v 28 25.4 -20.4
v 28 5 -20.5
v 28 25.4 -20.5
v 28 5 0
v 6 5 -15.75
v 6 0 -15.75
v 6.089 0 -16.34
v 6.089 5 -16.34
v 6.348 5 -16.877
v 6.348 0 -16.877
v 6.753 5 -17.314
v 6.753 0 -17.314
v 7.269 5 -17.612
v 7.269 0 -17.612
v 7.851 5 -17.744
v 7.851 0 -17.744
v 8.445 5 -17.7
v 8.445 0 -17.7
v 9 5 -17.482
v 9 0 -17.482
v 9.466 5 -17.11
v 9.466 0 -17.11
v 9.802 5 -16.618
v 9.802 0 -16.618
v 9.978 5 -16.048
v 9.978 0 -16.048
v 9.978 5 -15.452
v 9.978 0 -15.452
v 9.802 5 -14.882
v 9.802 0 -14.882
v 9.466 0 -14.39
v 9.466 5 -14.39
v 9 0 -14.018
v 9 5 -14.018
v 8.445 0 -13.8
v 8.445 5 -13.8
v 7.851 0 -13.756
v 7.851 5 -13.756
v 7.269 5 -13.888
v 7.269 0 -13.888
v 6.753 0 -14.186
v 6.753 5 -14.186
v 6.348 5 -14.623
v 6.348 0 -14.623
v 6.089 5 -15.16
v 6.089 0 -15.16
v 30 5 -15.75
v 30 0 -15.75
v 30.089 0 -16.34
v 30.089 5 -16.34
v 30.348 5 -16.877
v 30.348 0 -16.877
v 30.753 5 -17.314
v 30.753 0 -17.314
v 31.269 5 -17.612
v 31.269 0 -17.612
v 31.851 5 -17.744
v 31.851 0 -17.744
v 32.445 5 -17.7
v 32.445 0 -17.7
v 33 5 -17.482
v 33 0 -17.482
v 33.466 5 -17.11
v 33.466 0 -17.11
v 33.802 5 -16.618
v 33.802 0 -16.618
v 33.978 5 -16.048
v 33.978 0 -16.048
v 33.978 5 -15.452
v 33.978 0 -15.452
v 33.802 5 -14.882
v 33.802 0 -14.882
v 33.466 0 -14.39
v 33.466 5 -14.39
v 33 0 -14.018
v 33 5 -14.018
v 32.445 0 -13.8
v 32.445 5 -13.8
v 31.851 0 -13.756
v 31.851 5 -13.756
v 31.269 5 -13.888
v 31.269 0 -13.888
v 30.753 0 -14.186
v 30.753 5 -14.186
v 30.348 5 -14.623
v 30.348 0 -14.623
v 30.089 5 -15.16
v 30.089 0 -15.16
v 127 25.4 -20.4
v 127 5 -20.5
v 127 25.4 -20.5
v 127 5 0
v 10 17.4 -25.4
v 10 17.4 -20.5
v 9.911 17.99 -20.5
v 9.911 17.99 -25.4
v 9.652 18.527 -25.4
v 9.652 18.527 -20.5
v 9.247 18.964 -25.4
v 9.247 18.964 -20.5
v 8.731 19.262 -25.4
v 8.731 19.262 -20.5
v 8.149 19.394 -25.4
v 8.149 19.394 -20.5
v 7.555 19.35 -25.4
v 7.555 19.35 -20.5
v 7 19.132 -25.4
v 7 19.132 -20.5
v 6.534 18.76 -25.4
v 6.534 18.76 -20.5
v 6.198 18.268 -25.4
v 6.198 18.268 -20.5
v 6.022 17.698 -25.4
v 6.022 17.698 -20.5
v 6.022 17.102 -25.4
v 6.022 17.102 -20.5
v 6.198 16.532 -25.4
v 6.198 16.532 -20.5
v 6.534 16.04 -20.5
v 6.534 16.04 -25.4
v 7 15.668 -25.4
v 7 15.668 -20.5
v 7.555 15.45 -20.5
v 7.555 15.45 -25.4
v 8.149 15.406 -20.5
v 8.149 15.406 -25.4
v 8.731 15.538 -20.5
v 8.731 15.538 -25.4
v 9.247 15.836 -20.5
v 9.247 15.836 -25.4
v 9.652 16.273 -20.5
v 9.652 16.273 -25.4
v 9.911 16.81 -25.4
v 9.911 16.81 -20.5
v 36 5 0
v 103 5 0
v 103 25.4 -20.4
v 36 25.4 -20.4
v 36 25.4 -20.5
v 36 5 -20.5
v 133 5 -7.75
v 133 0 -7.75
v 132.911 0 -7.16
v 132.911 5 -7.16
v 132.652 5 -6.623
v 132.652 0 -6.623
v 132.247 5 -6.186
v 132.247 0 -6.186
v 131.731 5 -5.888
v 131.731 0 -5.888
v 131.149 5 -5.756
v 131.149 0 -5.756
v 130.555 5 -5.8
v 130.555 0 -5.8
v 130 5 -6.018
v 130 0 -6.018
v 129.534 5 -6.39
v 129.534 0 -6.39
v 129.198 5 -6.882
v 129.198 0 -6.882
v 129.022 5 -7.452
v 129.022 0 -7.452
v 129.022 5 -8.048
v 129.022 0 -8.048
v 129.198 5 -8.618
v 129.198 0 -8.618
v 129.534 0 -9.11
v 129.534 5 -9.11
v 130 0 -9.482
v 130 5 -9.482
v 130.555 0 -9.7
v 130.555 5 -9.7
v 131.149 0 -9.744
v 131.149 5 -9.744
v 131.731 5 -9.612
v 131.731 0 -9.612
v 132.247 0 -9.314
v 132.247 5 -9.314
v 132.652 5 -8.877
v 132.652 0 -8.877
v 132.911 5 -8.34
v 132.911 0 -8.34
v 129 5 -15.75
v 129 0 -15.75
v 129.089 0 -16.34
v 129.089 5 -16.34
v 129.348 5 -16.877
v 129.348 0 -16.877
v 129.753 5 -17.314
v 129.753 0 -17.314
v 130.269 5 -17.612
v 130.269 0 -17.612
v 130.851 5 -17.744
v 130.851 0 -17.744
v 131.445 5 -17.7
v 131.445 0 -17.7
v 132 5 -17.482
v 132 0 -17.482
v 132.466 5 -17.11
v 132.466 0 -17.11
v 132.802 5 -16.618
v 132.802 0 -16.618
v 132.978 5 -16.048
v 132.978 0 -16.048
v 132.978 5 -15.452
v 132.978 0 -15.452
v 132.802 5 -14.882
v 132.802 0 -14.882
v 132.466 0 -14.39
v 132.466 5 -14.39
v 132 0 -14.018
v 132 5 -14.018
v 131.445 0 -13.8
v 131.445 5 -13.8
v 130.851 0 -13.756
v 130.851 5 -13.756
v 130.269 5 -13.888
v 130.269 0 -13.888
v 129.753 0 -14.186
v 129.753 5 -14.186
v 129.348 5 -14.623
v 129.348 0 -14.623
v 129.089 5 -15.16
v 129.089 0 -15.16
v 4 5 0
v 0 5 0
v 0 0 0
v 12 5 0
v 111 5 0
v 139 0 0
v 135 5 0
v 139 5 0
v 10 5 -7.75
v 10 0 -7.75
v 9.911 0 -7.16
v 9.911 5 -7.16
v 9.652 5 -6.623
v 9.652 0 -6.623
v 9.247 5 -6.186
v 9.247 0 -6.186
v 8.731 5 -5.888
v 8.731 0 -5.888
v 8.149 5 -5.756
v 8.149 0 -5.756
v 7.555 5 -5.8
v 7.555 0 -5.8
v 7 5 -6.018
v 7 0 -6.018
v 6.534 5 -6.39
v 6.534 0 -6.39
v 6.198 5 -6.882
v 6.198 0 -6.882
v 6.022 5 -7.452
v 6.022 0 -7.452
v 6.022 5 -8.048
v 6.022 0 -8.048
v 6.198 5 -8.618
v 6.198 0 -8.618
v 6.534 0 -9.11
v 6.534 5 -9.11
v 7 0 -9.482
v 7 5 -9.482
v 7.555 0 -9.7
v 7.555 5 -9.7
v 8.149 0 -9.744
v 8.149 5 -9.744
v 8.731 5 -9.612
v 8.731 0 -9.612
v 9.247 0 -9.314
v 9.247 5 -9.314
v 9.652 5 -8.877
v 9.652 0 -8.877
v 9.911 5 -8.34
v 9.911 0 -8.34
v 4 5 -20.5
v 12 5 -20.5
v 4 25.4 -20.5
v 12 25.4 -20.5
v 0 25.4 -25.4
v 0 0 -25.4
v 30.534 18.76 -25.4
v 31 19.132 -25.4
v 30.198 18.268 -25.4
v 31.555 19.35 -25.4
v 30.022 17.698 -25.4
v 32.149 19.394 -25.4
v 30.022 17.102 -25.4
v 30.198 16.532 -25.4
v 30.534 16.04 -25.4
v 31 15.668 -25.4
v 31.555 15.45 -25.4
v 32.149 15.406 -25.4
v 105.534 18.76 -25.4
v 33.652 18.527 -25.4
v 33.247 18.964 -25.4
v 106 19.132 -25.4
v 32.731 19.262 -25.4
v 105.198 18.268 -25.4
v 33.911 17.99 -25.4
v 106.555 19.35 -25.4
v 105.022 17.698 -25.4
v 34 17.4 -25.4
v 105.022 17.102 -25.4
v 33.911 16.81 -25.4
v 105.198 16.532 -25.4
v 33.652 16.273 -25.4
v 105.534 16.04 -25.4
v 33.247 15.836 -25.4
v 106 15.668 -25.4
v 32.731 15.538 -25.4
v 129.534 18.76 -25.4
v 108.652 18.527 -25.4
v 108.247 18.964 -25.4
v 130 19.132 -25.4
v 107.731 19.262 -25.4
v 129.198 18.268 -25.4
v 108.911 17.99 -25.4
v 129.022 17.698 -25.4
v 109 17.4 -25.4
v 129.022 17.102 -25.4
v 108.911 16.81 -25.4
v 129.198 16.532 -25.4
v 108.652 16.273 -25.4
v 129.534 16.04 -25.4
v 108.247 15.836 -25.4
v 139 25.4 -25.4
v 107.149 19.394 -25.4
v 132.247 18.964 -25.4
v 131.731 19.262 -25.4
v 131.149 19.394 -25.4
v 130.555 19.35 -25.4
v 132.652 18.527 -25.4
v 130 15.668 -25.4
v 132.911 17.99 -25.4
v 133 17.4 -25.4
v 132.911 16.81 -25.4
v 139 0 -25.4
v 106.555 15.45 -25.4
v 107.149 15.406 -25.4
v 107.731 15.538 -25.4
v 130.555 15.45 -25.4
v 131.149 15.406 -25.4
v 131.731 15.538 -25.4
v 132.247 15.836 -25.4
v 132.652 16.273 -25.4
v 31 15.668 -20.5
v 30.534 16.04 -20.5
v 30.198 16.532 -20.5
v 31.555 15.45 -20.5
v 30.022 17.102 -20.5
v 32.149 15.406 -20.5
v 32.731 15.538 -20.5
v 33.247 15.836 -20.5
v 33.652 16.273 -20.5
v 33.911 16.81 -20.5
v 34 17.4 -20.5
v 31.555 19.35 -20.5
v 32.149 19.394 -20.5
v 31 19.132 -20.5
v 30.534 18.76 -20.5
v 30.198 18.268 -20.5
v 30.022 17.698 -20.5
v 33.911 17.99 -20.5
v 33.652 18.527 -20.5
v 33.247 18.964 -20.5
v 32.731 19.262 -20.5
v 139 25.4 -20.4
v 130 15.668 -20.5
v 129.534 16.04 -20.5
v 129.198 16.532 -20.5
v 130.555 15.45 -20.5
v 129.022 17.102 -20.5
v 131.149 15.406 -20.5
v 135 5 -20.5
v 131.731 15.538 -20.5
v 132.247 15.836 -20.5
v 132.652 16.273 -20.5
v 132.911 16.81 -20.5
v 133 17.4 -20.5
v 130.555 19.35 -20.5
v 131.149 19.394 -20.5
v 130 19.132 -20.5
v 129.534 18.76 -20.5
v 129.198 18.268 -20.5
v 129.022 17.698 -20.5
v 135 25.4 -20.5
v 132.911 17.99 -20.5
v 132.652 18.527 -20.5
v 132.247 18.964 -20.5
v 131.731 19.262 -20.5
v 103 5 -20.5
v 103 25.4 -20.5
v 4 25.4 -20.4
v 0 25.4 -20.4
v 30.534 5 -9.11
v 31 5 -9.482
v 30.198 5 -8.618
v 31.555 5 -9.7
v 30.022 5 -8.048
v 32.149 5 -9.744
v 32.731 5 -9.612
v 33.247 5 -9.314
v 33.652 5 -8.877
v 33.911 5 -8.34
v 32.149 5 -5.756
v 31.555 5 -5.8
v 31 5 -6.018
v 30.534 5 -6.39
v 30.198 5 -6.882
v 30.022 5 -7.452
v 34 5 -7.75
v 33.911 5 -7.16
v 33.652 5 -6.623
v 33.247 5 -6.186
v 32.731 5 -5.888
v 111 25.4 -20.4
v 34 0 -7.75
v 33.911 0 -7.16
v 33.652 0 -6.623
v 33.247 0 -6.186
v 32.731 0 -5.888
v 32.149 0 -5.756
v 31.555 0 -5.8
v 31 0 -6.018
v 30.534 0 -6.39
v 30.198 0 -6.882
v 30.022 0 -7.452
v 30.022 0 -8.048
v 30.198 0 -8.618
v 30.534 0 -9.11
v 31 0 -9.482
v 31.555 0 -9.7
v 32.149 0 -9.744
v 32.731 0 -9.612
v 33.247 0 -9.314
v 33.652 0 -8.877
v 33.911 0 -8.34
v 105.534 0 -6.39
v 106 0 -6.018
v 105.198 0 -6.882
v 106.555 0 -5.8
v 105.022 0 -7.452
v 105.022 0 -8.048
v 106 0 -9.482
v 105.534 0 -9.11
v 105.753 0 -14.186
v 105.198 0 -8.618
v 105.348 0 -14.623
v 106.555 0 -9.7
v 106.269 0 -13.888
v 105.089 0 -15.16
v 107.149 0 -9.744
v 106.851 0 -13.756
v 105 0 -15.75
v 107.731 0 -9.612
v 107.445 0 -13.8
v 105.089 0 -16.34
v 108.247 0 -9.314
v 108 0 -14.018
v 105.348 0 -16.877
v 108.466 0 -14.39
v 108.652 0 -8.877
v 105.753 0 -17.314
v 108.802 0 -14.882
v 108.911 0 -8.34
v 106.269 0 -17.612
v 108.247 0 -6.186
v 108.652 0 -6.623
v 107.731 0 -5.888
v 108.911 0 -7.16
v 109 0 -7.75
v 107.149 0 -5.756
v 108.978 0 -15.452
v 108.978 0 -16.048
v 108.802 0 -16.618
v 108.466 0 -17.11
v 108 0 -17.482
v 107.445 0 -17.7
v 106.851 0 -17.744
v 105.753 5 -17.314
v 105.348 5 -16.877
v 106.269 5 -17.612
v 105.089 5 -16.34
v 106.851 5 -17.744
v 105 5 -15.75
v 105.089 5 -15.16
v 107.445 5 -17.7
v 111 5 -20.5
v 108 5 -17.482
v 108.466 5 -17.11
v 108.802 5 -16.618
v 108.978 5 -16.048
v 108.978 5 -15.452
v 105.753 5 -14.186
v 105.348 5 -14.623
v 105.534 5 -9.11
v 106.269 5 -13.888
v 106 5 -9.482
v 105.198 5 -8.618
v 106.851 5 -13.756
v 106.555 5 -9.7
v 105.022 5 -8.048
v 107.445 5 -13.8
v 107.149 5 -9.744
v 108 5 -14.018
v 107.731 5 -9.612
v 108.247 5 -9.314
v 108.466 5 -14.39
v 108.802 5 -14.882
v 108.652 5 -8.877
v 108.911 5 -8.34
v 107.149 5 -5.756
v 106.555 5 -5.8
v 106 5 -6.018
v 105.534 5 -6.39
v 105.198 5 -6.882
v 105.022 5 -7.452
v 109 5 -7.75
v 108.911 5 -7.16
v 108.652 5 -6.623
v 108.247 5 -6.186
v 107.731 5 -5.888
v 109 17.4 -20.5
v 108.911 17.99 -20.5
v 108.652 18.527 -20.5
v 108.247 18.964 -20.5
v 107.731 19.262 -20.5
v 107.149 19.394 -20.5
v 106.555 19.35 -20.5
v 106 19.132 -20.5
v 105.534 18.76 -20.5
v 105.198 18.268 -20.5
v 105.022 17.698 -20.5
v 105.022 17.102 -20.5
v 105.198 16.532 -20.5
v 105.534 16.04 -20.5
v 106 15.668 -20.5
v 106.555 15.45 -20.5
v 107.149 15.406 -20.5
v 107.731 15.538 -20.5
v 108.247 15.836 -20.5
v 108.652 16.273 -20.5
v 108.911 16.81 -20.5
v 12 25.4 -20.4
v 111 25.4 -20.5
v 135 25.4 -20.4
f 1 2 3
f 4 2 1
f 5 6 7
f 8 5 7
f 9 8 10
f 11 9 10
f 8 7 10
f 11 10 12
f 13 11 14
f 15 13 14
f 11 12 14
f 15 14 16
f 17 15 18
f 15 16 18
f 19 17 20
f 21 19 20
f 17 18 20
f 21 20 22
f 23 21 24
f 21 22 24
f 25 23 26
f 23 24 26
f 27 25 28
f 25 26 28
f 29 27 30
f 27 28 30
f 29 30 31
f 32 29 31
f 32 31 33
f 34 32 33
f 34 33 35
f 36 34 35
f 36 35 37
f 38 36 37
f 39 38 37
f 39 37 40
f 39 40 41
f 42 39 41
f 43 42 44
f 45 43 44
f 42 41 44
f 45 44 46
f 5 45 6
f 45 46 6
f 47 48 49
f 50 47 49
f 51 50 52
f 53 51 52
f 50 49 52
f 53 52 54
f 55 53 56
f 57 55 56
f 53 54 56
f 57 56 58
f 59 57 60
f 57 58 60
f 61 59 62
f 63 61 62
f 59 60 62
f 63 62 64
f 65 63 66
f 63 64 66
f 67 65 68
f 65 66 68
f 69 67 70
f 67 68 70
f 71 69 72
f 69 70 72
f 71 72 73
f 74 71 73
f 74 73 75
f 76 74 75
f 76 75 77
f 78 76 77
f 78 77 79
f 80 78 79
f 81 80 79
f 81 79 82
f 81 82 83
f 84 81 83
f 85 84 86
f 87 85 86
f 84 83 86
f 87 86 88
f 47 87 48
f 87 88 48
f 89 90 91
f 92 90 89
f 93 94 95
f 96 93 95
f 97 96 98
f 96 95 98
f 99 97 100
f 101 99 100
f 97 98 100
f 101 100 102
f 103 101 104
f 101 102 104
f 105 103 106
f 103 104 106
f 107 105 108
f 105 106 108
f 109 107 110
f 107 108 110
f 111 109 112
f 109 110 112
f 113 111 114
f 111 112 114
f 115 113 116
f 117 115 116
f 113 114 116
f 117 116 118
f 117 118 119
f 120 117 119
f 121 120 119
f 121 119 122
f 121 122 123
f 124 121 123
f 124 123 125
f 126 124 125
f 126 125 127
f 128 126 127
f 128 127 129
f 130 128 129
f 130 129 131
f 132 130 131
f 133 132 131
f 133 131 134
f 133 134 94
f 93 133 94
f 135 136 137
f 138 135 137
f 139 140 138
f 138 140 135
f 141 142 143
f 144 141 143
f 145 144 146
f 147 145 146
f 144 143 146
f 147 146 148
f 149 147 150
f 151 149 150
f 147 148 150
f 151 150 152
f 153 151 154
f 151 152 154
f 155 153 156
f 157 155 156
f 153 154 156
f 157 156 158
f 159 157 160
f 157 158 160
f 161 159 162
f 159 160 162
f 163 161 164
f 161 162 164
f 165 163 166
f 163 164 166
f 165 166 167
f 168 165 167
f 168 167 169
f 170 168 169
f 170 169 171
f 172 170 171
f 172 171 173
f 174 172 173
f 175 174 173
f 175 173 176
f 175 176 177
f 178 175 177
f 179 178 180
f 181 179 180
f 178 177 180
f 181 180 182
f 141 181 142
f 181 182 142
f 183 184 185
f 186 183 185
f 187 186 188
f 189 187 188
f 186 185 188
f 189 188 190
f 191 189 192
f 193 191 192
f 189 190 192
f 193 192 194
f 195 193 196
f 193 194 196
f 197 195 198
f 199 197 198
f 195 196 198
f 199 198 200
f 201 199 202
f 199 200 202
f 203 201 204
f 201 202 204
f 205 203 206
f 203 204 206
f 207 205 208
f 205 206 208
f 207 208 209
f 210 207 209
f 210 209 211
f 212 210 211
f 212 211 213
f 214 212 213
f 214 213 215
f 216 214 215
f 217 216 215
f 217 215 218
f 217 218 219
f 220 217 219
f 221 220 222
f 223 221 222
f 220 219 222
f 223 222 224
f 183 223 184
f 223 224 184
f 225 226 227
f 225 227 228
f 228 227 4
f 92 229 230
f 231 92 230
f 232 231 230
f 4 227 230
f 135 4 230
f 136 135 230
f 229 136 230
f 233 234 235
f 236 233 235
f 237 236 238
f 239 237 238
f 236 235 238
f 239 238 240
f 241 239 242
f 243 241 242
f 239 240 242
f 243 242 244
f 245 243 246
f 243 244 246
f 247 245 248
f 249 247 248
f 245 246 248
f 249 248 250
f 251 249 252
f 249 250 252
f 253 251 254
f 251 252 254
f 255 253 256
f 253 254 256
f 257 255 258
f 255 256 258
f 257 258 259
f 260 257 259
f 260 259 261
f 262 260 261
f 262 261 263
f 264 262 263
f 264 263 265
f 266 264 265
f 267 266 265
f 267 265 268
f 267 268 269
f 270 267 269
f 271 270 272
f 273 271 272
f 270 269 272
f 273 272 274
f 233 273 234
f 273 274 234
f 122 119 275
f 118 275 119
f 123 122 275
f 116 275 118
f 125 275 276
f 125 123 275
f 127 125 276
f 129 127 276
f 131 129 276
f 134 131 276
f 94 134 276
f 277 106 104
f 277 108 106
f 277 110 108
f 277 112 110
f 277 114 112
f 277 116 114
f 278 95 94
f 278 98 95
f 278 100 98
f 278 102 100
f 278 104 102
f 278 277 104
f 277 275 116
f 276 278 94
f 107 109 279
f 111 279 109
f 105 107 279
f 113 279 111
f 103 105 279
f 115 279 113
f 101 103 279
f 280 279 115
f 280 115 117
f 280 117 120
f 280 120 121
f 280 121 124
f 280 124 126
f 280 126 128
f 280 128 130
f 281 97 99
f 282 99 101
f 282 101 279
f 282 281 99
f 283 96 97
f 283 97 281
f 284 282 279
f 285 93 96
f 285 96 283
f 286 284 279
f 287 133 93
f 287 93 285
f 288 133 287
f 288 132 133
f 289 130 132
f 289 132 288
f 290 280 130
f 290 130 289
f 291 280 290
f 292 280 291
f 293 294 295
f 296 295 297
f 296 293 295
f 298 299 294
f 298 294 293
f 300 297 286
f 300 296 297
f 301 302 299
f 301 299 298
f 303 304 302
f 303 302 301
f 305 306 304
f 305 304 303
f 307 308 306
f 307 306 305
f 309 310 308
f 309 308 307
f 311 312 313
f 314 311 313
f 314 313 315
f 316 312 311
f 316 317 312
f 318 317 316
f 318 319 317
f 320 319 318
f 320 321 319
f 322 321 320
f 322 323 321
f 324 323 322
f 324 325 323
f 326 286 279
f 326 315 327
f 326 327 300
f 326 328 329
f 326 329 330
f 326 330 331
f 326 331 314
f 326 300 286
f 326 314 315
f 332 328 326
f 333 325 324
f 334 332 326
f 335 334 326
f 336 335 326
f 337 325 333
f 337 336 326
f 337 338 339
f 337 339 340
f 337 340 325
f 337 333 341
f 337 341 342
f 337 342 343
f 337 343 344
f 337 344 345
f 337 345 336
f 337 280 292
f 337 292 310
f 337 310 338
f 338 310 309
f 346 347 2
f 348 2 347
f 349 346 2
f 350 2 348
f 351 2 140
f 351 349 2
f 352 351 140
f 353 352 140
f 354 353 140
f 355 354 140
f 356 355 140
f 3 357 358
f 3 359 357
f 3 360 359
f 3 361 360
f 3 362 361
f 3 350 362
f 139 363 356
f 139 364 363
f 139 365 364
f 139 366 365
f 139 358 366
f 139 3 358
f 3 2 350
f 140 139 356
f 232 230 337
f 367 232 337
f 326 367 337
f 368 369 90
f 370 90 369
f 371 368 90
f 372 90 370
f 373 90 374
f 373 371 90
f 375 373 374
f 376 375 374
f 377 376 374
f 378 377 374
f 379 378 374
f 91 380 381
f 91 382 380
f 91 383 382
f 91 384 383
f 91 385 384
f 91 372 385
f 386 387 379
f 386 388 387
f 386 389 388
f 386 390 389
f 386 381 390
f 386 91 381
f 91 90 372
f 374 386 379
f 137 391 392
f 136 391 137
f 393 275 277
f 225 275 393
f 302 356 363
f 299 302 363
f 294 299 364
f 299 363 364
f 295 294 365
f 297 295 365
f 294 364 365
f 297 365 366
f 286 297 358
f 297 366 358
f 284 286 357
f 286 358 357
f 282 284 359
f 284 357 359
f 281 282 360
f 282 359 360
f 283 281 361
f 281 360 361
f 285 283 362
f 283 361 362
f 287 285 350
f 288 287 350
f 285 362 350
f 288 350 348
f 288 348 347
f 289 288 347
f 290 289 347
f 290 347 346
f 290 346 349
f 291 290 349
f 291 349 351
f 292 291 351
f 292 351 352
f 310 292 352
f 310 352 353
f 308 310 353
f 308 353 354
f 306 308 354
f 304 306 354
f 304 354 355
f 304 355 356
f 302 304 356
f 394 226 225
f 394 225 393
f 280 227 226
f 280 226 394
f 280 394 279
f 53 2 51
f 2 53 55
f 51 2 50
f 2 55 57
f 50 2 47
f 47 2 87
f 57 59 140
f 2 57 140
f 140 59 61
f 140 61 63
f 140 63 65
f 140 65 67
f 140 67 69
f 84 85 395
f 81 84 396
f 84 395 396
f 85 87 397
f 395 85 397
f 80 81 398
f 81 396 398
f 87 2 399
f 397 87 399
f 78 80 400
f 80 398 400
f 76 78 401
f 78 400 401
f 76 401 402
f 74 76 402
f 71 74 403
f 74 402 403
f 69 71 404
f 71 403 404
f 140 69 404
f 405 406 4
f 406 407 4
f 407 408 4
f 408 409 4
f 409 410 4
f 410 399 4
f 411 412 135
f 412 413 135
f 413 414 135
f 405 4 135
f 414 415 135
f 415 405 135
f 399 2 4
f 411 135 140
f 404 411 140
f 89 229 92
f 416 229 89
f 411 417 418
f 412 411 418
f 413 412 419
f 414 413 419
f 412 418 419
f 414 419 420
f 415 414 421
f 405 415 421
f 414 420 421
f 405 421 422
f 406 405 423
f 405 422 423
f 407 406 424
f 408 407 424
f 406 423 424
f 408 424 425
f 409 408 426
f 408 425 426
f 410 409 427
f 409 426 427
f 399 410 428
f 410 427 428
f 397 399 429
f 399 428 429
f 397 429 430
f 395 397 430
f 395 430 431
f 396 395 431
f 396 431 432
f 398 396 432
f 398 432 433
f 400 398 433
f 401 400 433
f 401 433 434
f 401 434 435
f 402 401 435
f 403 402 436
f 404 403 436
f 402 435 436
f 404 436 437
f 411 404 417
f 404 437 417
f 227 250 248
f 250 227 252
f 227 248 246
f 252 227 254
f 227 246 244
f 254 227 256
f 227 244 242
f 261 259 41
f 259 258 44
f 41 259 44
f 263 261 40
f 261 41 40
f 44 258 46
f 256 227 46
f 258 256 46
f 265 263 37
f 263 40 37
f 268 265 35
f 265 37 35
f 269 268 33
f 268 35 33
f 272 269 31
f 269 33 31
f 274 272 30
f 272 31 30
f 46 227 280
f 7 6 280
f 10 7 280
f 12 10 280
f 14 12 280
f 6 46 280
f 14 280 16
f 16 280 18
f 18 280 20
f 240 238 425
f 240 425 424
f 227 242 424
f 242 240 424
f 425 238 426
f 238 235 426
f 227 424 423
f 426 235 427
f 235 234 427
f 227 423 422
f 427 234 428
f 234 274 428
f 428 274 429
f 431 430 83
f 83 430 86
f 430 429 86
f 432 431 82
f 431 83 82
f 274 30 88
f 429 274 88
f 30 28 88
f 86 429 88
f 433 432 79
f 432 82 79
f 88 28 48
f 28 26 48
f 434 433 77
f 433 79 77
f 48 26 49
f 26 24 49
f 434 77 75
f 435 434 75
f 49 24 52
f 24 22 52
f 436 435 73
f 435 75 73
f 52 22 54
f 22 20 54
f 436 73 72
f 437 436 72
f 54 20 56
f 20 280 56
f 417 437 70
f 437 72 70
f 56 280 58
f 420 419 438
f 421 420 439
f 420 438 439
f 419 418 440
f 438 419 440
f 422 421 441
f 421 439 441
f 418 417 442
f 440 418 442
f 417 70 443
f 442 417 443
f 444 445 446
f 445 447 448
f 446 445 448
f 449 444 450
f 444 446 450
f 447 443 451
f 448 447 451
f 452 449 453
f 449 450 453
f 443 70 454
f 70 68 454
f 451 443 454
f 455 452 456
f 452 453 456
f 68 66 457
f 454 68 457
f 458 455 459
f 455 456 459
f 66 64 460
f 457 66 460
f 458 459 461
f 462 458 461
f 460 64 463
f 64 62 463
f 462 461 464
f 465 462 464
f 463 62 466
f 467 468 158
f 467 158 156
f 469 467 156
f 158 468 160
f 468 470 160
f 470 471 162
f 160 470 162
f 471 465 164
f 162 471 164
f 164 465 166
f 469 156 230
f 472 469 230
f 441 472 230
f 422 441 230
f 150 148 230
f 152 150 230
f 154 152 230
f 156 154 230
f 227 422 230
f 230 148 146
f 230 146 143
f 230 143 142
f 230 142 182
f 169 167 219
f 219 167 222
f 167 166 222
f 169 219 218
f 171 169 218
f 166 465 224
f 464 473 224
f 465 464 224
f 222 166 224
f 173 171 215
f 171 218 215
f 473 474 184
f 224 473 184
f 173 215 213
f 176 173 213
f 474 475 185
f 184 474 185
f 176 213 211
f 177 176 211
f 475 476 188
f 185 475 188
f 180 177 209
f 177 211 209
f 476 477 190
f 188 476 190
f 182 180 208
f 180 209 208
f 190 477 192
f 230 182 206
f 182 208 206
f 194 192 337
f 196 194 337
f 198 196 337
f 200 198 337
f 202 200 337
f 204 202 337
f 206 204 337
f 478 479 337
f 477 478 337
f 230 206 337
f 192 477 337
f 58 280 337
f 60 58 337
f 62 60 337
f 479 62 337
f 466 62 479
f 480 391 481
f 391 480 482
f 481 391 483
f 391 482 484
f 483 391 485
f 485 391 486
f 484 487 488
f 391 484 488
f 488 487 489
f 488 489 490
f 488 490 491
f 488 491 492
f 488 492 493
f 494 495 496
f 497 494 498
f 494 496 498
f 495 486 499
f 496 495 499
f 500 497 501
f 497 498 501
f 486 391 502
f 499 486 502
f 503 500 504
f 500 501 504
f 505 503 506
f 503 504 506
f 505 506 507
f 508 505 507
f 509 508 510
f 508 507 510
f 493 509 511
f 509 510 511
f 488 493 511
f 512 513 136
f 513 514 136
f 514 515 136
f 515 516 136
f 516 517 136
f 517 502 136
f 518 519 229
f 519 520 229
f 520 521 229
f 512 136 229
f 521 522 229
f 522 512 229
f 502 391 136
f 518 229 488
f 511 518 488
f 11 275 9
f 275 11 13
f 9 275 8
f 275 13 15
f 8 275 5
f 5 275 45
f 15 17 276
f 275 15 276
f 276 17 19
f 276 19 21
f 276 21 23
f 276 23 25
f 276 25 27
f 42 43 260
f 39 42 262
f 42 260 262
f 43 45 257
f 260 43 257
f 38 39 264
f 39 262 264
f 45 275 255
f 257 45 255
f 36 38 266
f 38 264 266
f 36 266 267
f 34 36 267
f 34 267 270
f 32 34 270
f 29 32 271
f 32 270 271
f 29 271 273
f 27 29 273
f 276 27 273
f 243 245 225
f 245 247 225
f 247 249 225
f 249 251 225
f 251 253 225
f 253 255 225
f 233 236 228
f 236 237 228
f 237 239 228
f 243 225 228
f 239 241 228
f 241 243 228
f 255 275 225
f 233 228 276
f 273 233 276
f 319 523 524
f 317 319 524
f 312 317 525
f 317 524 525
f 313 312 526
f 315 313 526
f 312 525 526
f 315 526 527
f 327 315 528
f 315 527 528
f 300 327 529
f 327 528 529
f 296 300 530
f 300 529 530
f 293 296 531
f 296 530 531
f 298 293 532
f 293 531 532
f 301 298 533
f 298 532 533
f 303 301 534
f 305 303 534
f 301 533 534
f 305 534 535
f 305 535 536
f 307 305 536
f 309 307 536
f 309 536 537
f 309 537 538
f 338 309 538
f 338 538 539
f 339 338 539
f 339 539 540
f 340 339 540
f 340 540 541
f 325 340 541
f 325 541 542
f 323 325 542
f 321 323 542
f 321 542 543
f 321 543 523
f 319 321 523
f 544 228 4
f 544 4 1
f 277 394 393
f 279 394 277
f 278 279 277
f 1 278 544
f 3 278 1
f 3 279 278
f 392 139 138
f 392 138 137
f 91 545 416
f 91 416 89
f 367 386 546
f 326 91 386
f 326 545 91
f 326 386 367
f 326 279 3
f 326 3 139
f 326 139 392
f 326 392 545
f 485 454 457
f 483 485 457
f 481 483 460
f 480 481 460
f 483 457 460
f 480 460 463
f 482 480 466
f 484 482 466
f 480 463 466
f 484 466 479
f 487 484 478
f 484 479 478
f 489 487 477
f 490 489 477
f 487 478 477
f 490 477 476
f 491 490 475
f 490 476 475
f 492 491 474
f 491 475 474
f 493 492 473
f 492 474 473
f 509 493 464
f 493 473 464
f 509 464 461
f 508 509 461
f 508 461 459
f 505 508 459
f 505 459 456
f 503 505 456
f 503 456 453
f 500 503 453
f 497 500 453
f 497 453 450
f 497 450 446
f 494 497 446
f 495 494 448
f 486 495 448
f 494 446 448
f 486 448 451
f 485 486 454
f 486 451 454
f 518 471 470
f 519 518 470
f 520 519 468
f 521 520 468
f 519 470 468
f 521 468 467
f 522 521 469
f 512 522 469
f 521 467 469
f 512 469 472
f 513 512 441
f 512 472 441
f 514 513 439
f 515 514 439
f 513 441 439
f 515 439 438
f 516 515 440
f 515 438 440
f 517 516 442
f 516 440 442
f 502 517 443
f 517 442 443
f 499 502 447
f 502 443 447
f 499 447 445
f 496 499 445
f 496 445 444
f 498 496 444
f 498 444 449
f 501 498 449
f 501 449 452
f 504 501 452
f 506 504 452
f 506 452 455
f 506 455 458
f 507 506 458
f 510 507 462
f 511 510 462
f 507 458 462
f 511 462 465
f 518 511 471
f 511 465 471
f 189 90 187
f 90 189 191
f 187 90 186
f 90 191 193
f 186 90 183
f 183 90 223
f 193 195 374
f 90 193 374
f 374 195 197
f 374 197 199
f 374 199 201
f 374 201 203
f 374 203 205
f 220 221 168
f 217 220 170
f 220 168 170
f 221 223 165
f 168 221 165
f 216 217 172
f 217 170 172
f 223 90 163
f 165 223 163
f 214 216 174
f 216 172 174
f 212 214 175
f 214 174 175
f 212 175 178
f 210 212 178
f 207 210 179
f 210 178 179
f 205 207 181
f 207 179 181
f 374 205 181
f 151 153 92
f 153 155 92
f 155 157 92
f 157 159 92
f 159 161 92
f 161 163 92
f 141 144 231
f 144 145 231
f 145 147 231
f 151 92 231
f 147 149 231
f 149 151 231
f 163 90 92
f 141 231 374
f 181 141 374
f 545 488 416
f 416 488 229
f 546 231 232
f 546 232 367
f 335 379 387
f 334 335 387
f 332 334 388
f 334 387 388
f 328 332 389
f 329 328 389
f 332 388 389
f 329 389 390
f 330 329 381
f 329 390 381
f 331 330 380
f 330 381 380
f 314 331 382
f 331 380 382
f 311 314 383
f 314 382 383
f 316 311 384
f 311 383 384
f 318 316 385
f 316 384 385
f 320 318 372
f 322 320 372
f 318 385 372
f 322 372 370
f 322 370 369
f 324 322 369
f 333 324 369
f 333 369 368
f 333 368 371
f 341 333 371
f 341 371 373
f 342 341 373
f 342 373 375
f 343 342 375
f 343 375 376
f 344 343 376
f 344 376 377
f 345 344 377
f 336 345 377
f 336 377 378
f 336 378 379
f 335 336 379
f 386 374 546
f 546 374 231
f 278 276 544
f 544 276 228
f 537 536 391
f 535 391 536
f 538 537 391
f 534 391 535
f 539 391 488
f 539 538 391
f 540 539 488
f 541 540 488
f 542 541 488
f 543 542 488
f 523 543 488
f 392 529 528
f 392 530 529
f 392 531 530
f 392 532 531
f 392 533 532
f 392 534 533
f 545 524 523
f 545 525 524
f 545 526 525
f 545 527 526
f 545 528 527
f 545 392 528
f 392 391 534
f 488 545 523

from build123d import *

# Parameters (mm, degrees)
BOSS_EXTRUDE1_DEPTH     = 5
SKETCH3_W               = 139
SKETCH3_H               = 5
BOSS_EXTRUDE2_DEPTH     = 20.4
SKETCH4_W               = 139
SKETCH4_H               = 20.4
BOSS_EXTRUDE3_DEPTH     = 20.5
CUT_EXTRUDE1_DEPTH      = 144.584156508
CUT_EXTRUDE1_DEPTH_BACK = 144.584156508
SKETCH7_W               = 8
SKETCH7_H               = 20.4
CUT_EXTRUDE2_DEPTH      = 20.5
SKETCH8_R               = 2
CUT_EXTRUDE3_DEPTH      = 10


with BuildPart() as part:
    # Sketch1 → Boss-Extrude1 (new body)
    with BuildSketch(Plane(origin=(0, 0, 0), x_dir=(1, 0, 0), z_dir=(0, 1, 0))):
        with BuildLine():
            Line((0, 15.75), (0, 7.75))
            Line((0, 7.75), (6, 7.75))
            ThreePointArc((6, 7.75), (8, 9.75), (10, 7.75))
            Line((10, 7.75), (30, 7.75))
            ThreePointArc((30, 7.75), (32, 9.75), (34, 7.75))
            Line((34, 7.75), (105, 7.75))
            ThreePointArc((105, 7.75), (107, 9.75), (109, 7.75))
            Line((109, 7.75), (129, 7.75))
            ThreePointArc((129, 7.75), (131, 9.75), (133, 7.75))
            Line((133, 7.75), (139, 7.75))
            Line((139, 7.75), (139, 15.75))
            Line((139, 15.75), (133, 15.75))
            ThreePointArc((133, 15.75), (131, 13.75), (129, 15.75))
            Line((129, 15.75), (109, 15.75))
            ThreePointArc((109, 15.75), (107, 13.75), (105, 15.75))
            Line((105, 15.75), (34, 15.75))
            ThreePointArc((34, 15.75), (32, 13.75), (30, 15.75))
            Line((30, 15.75), (24, 15.75))
            Line((24, 15.75), (16, 15.75))
            Line((16, 15.75), (10, 15.75))
            ThreePointArc((10, 15.75), (8, 13.75), (6, 15.75))
            Line((6, 15.75), (0, 15.75))
        make_face()
        with BuildLine():
            Line((0, 7.75), (0, 0))
            Line((0, 0), (139, 0))
            Line((139, 0), (139, 7.75))
            Line((139, 7.75), (133, 7.75))
            ThreePointArc((133, 7.75), (131, 5.75), (129, 7.75))
            Line((129, 7.75), (109, 7.75))
            ThreePointArc((109, 7.75), (107, 5.75), (105, 7.75))
            Line((105, 7.75), (34, 7.75))
            ThreePointArc((34, 7.75), (32, 5.75), (30, 7.75))
            Line((30, 7.75), (10, 7.75))
            ThreePointArc((10, 7.75), (8, 5.75), (6, 7.75))
            Line((6, 7.75), (0, 7.75))
        make_face()
        with BuildLine():
            Line((0, 20.4), (0, 15.75))
            Line((0, 15.75), (6, 15.75))
            ThreePointArc((6, 15.75), (8, 17.75), (10, 15.75))
            Line((10, 15.75), (16, 15.75))
            Line((16, 15.75), (24, 15.75))
            Line((24, 15.75), (30, 15.75))
            ThreePointArc((30, 15.75), (32, 17.75), (34, 15.75))
            Line((34, 15.75), (105, 15.75))
            ThreePointArc((105, 15.75), (107, 17.75), (109, 15.75))
            Line((109, 15.75), (129, 15.75))
            ThreePointArc((129, 15.75), (131, 17.75), (133, 15.75))
            Line((133, 15.75), (139, 15.75))
            Line((139, 15.75), (139, 20.4))
            Line((139, 20.4), (0, 20.4))
        make_face()
        Polygon((0, 23.75), (0, 20.4), (139, 20.4), (139, 25.4), (0, 25.4), align=None)
    extrude(amount=BOSS_EXTRUDE1_DEPTH)

    # Sketch3 → Boss-Extrude2 (add)
    with BuildSketch(Plane(origin=(0, 5, 0), x_dir=(1, 0, 0), z_dir=(0, 1, 0))):
        with Locations((69.5, 22.9)):
            Rectangle(SKETCH3_W, SKETCH3_H)
    extrude(amount=BOSS_EXTRUDE2_DEPTH)

    # Sketch4 → Boss-Extrude3 (add)
    with BuildSketch(Plane(origin=(0, 5, 0), x_dir=(1, 0, 0), z_dir=(0, 1, 0))):
        with Locations((69.5, 10.2)):
            Rectangle(SKETCH4_W, SKETCH4_H)
    extrude(amount=BOSS_EXTRUDE3_DEPTH)

    # Sketch5 → Cut-Extrude1 (cut, two sides: drawn at the far end of the back side and taken through both)
    with BuildSketch(Plane(origin=(139, 0, 0), x_dir=(0, 0, -1), z_dir=(1, 0, 0)).offset(-CUT_EXTRUDE1_DEPTH_BACK)):
        Polygon((0, 5), (20.4, 25.4), (20.4, 25.5), (0, 25.5), align=None)
    extrude(amount=CUT_EXTRUDE1_DEPTH + CUT_EXTRUDE1_DEPTH_BACK, mode=Mode.SUBTRACT)

    # Sketch7 → Cut-Extrude2 (cut)
    with BuildSketch(Plane.XY):
        with Locations((8, 15.2)):
            Rectangle(SKETCH7_W, SKETCH7_H)
        with Locations((32, 15.2)):
            Rectangle(SKETCH7_W, SKETCH7_H)
        with Locations((107, 15.2)):
            Rectangle(SKETCH7_W, SKETCH7_H)
        with Locations((131, 15.2)):
            Rectangle(SKETCH7_W, SKETCH7_H)
    extrude(amount=-CUT_EXTRUDE2_DEPTH, mode=Mode.SUBTRACT)

    # Sketch8 → Cut-Extrude3 (cut)
    with BuildSketch(Plane.XY.offset(-20.5)):
        with Locations((8, 17.4)):
            Circle(SKETCH8_R)
        with Locations((32, 17.4)):
            Circle(SKETCH8_R)
        with Locations((107, 17.4)):
            Circle(SKETCH8_R)
        with Locations((131, 17.4)):
            Circle(SKETCH8_R)
    extrude(amount=-CUT_EXTRUDE3_DEPTH, mode=Mode.SUBTRACT)


solid = part.part
